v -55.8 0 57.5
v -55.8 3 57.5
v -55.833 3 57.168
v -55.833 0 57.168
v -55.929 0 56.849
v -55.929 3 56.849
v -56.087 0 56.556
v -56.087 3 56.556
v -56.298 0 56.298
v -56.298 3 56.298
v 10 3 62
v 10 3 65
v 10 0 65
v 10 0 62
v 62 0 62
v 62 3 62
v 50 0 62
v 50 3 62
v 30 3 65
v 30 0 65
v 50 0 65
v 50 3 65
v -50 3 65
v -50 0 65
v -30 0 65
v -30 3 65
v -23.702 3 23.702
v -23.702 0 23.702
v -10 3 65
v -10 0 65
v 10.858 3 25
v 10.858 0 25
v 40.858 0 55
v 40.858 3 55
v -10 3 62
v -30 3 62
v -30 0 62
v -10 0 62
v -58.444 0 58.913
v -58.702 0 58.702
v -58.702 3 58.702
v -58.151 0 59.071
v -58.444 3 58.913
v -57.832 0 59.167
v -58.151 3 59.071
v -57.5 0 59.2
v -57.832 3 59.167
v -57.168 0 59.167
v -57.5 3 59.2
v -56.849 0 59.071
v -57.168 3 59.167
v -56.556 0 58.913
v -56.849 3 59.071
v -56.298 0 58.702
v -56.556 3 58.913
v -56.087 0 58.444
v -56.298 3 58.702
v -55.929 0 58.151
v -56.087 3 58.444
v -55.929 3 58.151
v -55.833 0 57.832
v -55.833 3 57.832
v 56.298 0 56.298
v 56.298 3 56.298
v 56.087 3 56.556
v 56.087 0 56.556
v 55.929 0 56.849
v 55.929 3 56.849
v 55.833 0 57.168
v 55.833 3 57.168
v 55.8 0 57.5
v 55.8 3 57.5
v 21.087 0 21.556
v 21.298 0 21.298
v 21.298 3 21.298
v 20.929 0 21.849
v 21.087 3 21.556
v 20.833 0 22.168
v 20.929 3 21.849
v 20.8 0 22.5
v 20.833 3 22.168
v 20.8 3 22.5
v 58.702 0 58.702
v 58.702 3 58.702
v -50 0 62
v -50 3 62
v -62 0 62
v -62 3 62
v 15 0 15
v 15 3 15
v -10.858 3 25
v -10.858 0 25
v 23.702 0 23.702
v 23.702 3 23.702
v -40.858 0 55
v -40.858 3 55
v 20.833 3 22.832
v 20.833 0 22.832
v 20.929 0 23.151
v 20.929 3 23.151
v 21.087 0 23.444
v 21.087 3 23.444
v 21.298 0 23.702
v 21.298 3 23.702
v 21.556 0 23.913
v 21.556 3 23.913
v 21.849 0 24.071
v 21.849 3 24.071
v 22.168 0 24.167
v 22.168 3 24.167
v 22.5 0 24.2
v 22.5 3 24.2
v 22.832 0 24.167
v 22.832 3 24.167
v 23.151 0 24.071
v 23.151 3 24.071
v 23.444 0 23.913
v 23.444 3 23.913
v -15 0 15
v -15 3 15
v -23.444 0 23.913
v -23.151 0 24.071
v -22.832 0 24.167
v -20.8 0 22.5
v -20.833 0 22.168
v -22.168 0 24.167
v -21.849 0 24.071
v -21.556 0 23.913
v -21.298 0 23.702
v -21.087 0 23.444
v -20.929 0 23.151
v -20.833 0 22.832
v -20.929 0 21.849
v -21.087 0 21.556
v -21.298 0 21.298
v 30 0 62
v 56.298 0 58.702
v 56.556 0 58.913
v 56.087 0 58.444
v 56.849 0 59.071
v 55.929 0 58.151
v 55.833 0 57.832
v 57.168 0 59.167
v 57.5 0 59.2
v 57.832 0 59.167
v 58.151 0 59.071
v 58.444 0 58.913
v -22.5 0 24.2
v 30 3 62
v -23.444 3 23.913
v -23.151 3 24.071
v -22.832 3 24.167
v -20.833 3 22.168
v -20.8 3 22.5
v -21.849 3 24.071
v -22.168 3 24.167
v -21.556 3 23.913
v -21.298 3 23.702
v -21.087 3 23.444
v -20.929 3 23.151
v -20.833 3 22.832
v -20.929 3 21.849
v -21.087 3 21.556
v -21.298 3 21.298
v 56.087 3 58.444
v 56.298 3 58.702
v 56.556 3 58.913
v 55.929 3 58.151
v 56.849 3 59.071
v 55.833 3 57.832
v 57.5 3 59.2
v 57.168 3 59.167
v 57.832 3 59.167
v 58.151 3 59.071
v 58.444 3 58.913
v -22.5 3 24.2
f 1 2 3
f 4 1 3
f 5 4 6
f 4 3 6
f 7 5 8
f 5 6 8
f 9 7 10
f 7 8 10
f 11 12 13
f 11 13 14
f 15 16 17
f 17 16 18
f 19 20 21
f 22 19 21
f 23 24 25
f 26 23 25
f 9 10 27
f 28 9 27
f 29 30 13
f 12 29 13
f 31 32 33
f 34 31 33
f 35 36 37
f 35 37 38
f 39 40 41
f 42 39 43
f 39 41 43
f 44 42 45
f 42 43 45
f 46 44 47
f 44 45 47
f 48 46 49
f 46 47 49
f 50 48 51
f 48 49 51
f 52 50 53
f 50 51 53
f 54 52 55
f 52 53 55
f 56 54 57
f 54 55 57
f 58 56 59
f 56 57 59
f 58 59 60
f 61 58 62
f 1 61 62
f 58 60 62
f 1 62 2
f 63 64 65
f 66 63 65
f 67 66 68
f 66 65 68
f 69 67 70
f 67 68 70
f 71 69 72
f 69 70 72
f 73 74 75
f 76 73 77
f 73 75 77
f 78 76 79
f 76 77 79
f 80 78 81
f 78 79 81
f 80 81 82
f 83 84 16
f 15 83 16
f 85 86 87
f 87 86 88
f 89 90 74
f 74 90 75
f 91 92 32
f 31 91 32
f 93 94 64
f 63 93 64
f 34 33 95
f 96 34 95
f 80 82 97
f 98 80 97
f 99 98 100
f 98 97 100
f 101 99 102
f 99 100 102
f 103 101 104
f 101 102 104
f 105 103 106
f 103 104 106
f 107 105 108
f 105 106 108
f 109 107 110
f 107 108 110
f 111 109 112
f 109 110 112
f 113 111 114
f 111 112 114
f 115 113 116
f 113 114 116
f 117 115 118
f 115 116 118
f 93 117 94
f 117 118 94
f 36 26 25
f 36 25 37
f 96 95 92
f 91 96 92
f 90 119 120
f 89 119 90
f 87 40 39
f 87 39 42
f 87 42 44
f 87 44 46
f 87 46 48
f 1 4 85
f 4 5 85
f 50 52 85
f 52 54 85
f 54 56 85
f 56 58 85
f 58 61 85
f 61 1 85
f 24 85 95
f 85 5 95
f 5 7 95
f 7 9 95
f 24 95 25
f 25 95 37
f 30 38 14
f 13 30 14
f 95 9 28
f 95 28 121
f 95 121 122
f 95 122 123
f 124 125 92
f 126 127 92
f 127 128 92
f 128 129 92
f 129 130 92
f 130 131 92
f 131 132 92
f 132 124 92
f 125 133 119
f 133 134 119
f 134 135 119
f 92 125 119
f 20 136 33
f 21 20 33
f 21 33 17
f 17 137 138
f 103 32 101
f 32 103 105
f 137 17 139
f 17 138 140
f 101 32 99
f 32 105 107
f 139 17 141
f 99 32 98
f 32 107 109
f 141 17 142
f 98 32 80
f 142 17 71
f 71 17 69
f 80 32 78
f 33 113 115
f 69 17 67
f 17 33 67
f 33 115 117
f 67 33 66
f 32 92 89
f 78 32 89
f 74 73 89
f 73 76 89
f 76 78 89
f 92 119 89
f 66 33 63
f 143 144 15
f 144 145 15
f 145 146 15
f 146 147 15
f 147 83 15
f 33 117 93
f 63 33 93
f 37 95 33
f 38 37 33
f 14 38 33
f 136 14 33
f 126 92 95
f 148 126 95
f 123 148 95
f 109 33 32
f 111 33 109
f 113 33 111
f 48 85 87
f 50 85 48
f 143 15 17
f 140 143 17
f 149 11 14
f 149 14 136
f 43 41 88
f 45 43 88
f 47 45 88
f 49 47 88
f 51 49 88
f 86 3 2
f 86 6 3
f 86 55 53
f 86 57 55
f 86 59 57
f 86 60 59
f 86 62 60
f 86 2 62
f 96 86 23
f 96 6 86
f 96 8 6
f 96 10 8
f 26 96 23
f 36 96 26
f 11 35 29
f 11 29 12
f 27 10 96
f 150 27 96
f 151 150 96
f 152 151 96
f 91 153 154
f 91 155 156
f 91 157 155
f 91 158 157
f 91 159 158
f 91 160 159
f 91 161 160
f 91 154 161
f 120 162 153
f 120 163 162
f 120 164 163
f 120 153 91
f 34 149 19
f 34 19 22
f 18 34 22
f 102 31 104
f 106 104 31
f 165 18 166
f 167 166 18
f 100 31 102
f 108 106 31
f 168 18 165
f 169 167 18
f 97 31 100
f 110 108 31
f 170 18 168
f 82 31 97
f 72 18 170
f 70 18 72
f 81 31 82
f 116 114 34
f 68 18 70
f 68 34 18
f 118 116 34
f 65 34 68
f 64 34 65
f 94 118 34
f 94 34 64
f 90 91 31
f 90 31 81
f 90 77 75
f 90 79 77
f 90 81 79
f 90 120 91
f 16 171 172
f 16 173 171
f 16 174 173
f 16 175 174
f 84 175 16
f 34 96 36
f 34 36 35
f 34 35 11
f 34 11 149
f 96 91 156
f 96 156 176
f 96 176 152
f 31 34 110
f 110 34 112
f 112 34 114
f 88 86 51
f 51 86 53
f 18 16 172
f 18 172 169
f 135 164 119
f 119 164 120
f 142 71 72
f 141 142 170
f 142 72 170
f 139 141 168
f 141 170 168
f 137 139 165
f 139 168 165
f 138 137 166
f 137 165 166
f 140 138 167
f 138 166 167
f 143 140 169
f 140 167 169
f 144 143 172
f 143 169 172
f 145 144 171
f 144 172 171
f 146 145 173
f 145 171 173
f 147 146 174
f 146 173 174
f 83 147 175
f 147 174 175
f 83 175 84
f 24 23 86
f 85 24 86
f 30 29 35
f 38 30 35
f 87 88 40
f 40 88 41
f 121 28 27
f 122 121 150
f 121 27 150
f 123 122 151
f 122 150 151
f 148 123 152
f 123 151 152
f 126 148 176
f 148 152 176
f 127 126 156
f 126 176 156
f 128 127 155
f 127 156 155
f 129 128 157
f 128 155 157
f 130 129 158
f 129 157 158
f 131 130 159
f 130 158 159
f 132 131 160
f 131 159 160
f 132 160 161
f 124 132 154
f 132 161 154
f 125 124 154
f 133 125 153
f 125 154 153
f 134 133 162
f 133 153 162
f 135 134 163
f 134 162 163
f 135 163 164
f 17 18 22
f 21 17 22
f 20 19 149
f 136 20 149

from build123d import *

# Parameters (mm, degrees)
SKETCH1_W           = 130
SKETCH1_H           = 130
SKETCH1_W_2         = 30
SKETCH1_H_2         = 30
BOSS_EXTRUDE1_DEPTH = 3
CUT_EXTRUDE1_DEPTH  = 3
CUT_EXTRUDE2_DEPTH  = 3
CUT_EXTRUDE3_DEPTH  = 10
SKETCH6_W           = 20
SKETCH6_H           = 3
CUT_EXTRUDE4_DEPTH  = 10


with BuildPart() as part:
    # Sketch1 → Boss-Extrude1 (new body)
    with BuildSketch(Plane(origin=(0, 0, 0), x_dir=(1, 0, 0), z_dir=(0, 1, 0))):
        Rectangle(SKETCH1_W, SKETCH1_H)
        Polygon((-55, 40.857864376), (-25, 10.857864376), (-25, -10.857864376), (-55, -40.857864376), align=None, mode=Mode.SUBTRACT)
        Polygon((-40.857864376, -55), (-10.857864376, -25), (10.857864376, -25), (40.857864376, -55), align=None, mode=Mode.SUBTRACT)
        Polygon((55, -40.857864376), (25, -10.857864376), (25, 10.857864376), (55, 40.857864376), align=None, mode=Mode.SUBTRACT)
        Polygon((40.857864376, 55), (10.857864376, 25), (-10.857864376, 25), (-40.857864376, 55), align=None, mode=Mode.SUBTRACT)
        Rectangle(SKETCH1_W_2, SKETCH1_H_2, mode=Mode.SUBTRACT)
    extrude(amount=BOSS_EXTRUDE1_DEPTH)

    # Sketch2 → Cut-Extrude1 (cut)
    with BuildSketch(Plane(origin=(0, 3, 0), x_dir=(1, 0, 0), z_dir=(0, 1, 0))):
        with BuildLine():
            ThreePointArc((-55.8, 57.5), (-58.702081528, 58.702081528), (-57.5, 55.8))
            Line((-57.5, 55.8), (-57.5, 57.5))
            Line((-57.5, 57.5), (-55.8, 57.5))
        make_face()
        with BuildLine():
            Line((-57.5, 57.5), (-57.5, 55.8))
            ThreePointArc((-57.5, 55.8), (-56.297918472, 56.297918472), (-55.8, 57.5))
            Line((-55.8, 57.5), (-57.5, 57.5))
        make_face()
        with BuildLine():
            Line((-57.5, -55.8), (-57.5, -57.5))
            Line((-57.5, -57.5), (-55.8, -57.5))
            ThreePointArc((-55.8, -57.5), (-56.297918472, -56.297918472), (-57.5, -55.8))
        make_face()
        with BuildLine():
            Line((-55.8, -57.5), (-57.5, -57.5))
            Line((-57.5, -57.5), (-57.5, -55.8))
            ThreePointArc((-57.5, -55.8), (-58.702081528, -58.702081528), (-55.8, -57.5))
        make_face()
        with BuildLine():
            ThreePointArc((57.5, -55.8), (56.297918472, -56.297918472), (55.8, -57.5))
            Line((55.8, -57.5), (57.5, -57.5))
            Line((57.5, -57.5), (57.5, -55.8))
        make_face()
        with BuildLine():
            Line((57.5, -57.5), (55.8, -57.5))
            ThreePointArc((55.8, -57.5), (57.5, -59.2), (59.2, -57.5))
            ThreePointArc((59.2, -57.5), (58.702081528, -56.297918472), (57.5, -55.8))
            Line((57.5, -55.8), (57.5, -57.5))
        make_face()
        with BuildLine():
            ThreePointArc((55.8, 57.5), (56.297918472, 56.297918472), (57.5, 55.8))
            Line((57.5, 55.8), (57.5, 57.5))
            Line((57.5, 57.5), (55.8, 57.5))
        make_face()
        with BuildLine():
            Line((57.5, 57.5), (57.5, 55.8))
            ThreePointArc((57.5, 55.8), (58.702081528, 56.297918472), (59.2, 57.5))
            ThreePointArc((59.2, 57.5), (57.5, 59.2), (55.8, 57.5))
            Line((55.8, 57.5), (57.5, 57.5))
        make_face()
    extrude(amount=-CUT_EXTRUDE1_DEPTH, mode=Mode.SUBTRACT)

    # Sketch3 → Cut-Extrude2 (cut)
    with BuildSketch(Plane(origin=(0, 3, 0), x_dir=(1, 0, 0), z_dir=(0, 1, 0))):
        with BuildLine():
            Line((-22.5, -20.8), (-22.5, -22.5))
            Line((-22.5, -22.5), (-20.8, -22.5))
            ThreePointArc((-20.8, -22.5), (-21.297918472, -21.297918472), (-22.5, -20.8))
        make_face()
        with BuildLine():
            Line((-20.8, -22.5), (-22.5, -22.5))
            Line((-22.5, -22.5), (-22.5, -20.8))
            ThreePointArc((-22.5, -20.8), (-23.702081528, -23.702081528), (-20.8, -22.5))
        make_face()
        with BuildLine():
            ThreePointArc((-20.8, 22.5), (-23.702081528, 23.702081528), (-22.5, 20.8))
            Line((-22.5, 20.8), (-22.5, 22.5))
            Line((-22.5, 22.5), (-20.8, 22.5))
        make_face()
        with BuildLine():
            Line((-22.5, 22.5), (-22.5, 20.8))
            ThreePointArc((-22.5, 20.8), (-21.297918472, 21.297918472), (-20.8, 22.5))
            Line((-20.8, 22.5), (-22.5, 22.5))
        make_face()
        with BuildLine():
            ThreePointArc((22.5, -20.8), (21.297918472, -21.297918472), (20.8, -22.5))
            Line((20.8, -22.5), (22.5, -22.5))
            Line((22.5, -22.5), (22.5, -20.8))
        make_face()
        with BuildLine():
            Line((22.5, -22.5), (20.8, -22.5))
            ThreePointArc((20.8, -22.5), (22.5, -24.2), (24.2, -22.5))
            ThreePointArc((24.2, -22.5), (23.702081528, -21.297918472), (22.5, -20.8))
            Line((22.5, -20.8), (22.5, -22.5))
        make_face()
        with BuildLine():
            ThreePointArc((20.8, 22.5), (21.297918472, 21.297918472), (22.5, 20.8))
            Line((22.5, 20.8), (22.5, 22.5))
            Line((22.5, 22.5), (20.8, 22.5))
        make_face()
        with BuildLine():
            Line((22.5, 22.5), (22.5, 20.8))
            ThreePointArc((22.5, 20.8), (23.702081528, 21.297918472), (24.2, 22.5))
            ThreePointArc((24.2, 22.5), (22.5, 24.2), (20.8, 22.5))
            Line((20.8, 22.5), (22.5, 22.5))
        make_face()
    extrude(amount=-CUT_EXTRUDE2_DEPTH, mode=Mode.SUBTRACT)

    # Sketch4 → Cut-Extrude3 (cut)
    # profile 1 of 14: a face of its own
    with BuildSketch(Plane(origin=(0, 3, 0), x_dir=(1, 0, 0), z_dir=(0, 1, 0))):
        with BuildLine():
            Line((-65, 65), (-65, -65))
            Line((-65, -65), (-58.702081528, -58.702081528))
            ThreePointArc((-58.702081528, -58.702081528), (-58.702081528, -56.297918472), (-56.297918472, -56.297918472))
            Line((-56.297918472, -56.297918472), (-23.702081528, -23.702081528))
            ThreePointArc((-23.702081528, -23.702081528), (-23.702081528, -21.297918472), (-21.297918472, -21.297918472))
            Line((-21.297918472, -21.297918472), (-15, -15))
            Line((-15, -15), (-15, 15))
            Line((-15, 15), (-21.297918472, 21.297918472))
            ThreePointArc((-21.297918472, 21.297918472), (-23.702081528, 21.297918472), (-23.702081528, 23.702081528))
            Line((-23.702081528, 23.702081528), (-56.297918472, 56.297918472))
            ThreePointArc((-56.297918472, 56.297918472), (-58.702081528, 56.297918472), (-58.702081528, 58.702081528))
            Line((-58.702081528, 58.702081528), (-65, 65))
        make_face()
        Polygon((-55, -40.857864376), (-55, 40.857864376), (-25, 10.857864376), (-25, -10.857864376), align=None, mode=Mode.SUBTRACT)
    # profile 2 of 14: a face of its own
    with BuildSketch(Plane(origin=(0, 3, 0), x_dir=(1, 0, 0), z_dir=(0, 1, 0))):
        Polygon((-55, 40.857864376), (-25, 10.857864376), (-25, -10.857864376), (-55, -40.857864376), align=None)
    # profile 3 of 14: a face of its own
    with BuildSketch(Plane(origin=(0, 3, 0), x_dir=(1, 0, 0), z_dir=(0, 1, 0))):
        with BuildLine():
            Line((65, 65), (-65, 65))
            Line((-65, 65), (-58.702081528, 58.702081528))
            ThreePointArc((-58.702081528, 58.702081528), (-56.849438165, 59.070595205), (-55.8, 57.5))
            ThreePointArc((-55.8, 57.5), (-55.929404795, 56.849438165), (-56.297918472, 56.297918472))
            Line((-56.297918472, 56.297918472), (-23.702081528, 23.702081528))
            ThreePointArc((-23.702081528, 23.702081528), (-21.849438165, 24.070595205), (-20.8, 22.5))
            ThreePointArc((-20.8, 22.5), (-20.929404795, 21.849438165), (-21.297918472, 21.297918472))
            Line((-21.297918472, 21.297918472), (-15, 15))
            Line((-15, 15), (15, 15))
            Line((15, 15), (21.297918472, 21.297918472))
            ThreePointArc((21.297918472, 21.297918472), (21.297918472, 23.702081528), (23.702081528, 23.702081528))
            Line((23.702081528, 23.702081528), (56.297918472, 56.297918472))
            ThreePointArc((56.297918472, 56.297918472), (56.297918472, 58.702081528), (58.702081528, 58.702081528))
            Line((58.702081528, 58.702081528), (65, 65))
        make_face()
        Polygon((40.857864376, 55), (10.857864376, 25), (-10.857864376, 25), (-40.857864376, 55), align=None, mode=Mode.SUBTRACT)
    # profile 4 of 14: a face of its own
    with BuildSketch(Plane(origin=(0, 3, 0), x_dir=(1, 0, 0), z_dir=(0, 1, 0))):
        Polygon((10.857864376, 25), (-10.857864376, 25), (-40.857864376, 55), (40.857864376, 55), align=None)
    # profile 5 of 14: a face of its own
    with BuildSketch(Plane(origin=(0, 3, 0), x_dir=(1, 0, 0), z_dir=(0, 1, 0))):
        with BuildLine():
            Line((58.702081528, -58.702081528), (65, -65))
            Line((65, -65), (65, 65))
            Line((65, 65), (58.702081528, 58.702081528))
            ThreePointArc((58.702081528, 58.702081528), (59.070595205, 58.150561835), (59.2, 57.5))
            ThreePointArc((59.2, 57.5), (58.150561835, 55.929404795), (56.297918472, 56.297918472))
            Line((56.297918472, 56.297918472), (23.702081528, 23.702081528))
            ThreePointArc((23.702081528, 23.702081528), (24.070595205, 23.150561835), (24.2, 22.5))
            ThreePointArc((24.2, 22.5), (23.150561835, 20.929404795), (21.297918472, 21.297918472))
            Line((21.297918472, 21.297918472), (15, 15))
            Line((15, 15), (15, -15))
            Line((15, -15), (21.297918472, -21.297918472))
            ThreePointArc((21.297918472, -21.297918472), (23.150561835, -20.929404795), (24.2, -22.5))
            ThreePointArc((24.2, -22.5), (24.070595205, -23.150561835), (23.702081528, -23.702081528))
            Line((23.702081528, -23.702081528), (56.297918472, -56.297918472))
            ThreePointArc((56.297918472, -56.297918472), (58.150561835, -55.929404795), (59.2, -57.5))
            ThreePointArc((59.2, -57.5), (59.070595205, -58.150561835), (58.702081528, -58.702081528))
        make_face()
        Polygon((55, -40.857864376), (25, -10.857864376), (25, 10.857864376), (55, 40.857864376), align=None, mode=Mode.SUBTRACT)
    # profile 6 of 14: a face of its own
    with BuildSketch(Plane(origin=(0, 3, 0), x_dir=(1, 0, 0), z_dir=(0, 1, 0))):
        Polygon((25, -10.857864376), (25, 10.857864376), (55, 40.857864376), (55, -40.857864376), align=None)
    # profile 7 of 14: a face of its own
    with BuildSketch(Plane(origin=(0, 3, 0), x_dir=(1, 0, 0), z_dir=(0, 1, 0))):
        with BuildLine():
            ThreePointArc((-56.297918472, -56.297918472), (-58.702081528, -56.297918472), (-58.702081528, -58.702081528))
            Line((-58.702081528, -58.702081528), (-56.297918472, -56.297918472))
        make_face()
    # profile 8 of 14: a face of its own
    with BuildSketch(Plane(origin=(0, 3, 0), x_dir=(1, 0, 0), z_dir=(0, 1, 0))):
        with BuildLine():
            Line((-56.297918472, -56.297918472), (-58.702081528, -58.702081528))
            ThreePointArc((-58.702081528, -58.702081528), (-56.849438165, -59.070595205), (-55.8, -57.5))
            ThreePointArc((-55.8, -57.5), (-55.929404795, -56.849438165), (-56.297918472, -56.297918472))
        make_face()
    # profile 9 of 14: a face of its own
    with BuildSketch(Plane(origin=(0, 3, 0), x_dir=(1, 0, 0), z_dir=(0, 1, 0))):
        with BuildLine():
            ThreePointArc((-21.297918472, -21.297918472), (-23.702081528, -21.297918472), (-23.702081528, -23.702081528))
            Line((-23.702081528, -23.702081528), (-21.297918472, -21.297918472))
        make_face()
    # profile 10 of 14: a face of its own
    with BuildSketch(Plane(origin=(0, 3, 0), x_dir=(1, 0, 0), z_dir=(0, 1, 0))):
        with BuildLine():
            Line((-21.297918472, -21.297918472), (-23.702081528, -23.702081528))
            ThreePointArc((-23.702081528, -23.702081528), (-21.849438165, -24.070595205), (-20.8, -22.5))
            ThreePointArc((-20.8, -22.5), (-20.929404795, -21.849438165), (-21.297918472, -21.297918472))
        make_face()
    # profile 11 of 14: a face of its own
    with BuildSketch(Plane(origin=(0, 3, 0), x_dir=(1, 0, 0), z_dir=(0, 1, 0))):
        with BuildLine():
            ThreePointArc((21.297918472, -21.297918472), (21.297918472, -23.702081528), (23.702081528, -23.702081528))
            Line((23.702081528, -23.702081528), (21.297918472, -21.297918472))
        make_face()
    # profile 12 of 14: a face of its own
    with BuildSketch(Plane(origin=(0, 3, 0), x_dir=(1, 0, 0), z_dir=(0, 1, 0))):
        with BuildLine():
            Line((21.297918472, -21.297918472), (23.702081528, -23.702081528))
            ThreePointArc((23.702081528, -23.702081528), (24.070595205, -23.150561835), (24.2, -22.5))
            ThreePointArc((24.2, -22.5), (23.150561835, -20.929404795), (21.297918472, -21.297918472))
        make_face()
    # profile 13 of 14: a face of its own
    with BuildSketch(Plane(origin=(0, 3, 0), x_dir=(1, 0, 0), z_dir=(0, 1, 0))):
        with BuildLine():
            ThreePointArc((56.297918472, -56.297918472), (56.297918472, -58.702081528), (58.702081528, -58.702081528))
            Line((58.702081528, -58.702081528), (56.297918472, -56.297918472))
        make_face()
    # profile 14 of 14: a face of its own
    with BuildSketch(Plane(origin=(0, 3, 0), x_dir=(1, 0, 0), z_dir=(0, 1, 0))):
        with BuildLine():
            Line((56.297918472, -56.297918472), (58.702081528, -58.702081528))
            ThreePointArc((58.702081528, -58.702081528), (59.070595205, -58.150561835), (59.2, -57.5))
            ThreePointArc((59.2, -57.5), (58.150561835, -55.929404795), (56.297918472, -56.297918472))
        make_face()
    extrude(amount=-CUT_EXTRUDE3_DEPTH, mode=Mode.SUBTRACT)

    # Sketch6 → Cut-Extrude4 (cut)
    with BuildSketch(Plane(origin=(0, 3, 0), x_dir=(1, 0, 0), z_dir=(0, 1, 0))):
        Polygon((-62, -62), (-65, -65), (-50, -65), (-50, -62), align=None)
        with Locations((-20, -63.5)):
            Rectangle(SKETCH6_W, SKETCH6_H)
        with Locations((20, -63.5)):
            Rectangle(SKETCH6_W, SKETCH6_H)
        Polygon((50, -62), (50, -65), (65, -65), (62, -62), align=None)
    extrude(amount=-CUT_EXTRUDE4_DEPTH, mode=Mode.SUBTRACT)


solid = part.part
